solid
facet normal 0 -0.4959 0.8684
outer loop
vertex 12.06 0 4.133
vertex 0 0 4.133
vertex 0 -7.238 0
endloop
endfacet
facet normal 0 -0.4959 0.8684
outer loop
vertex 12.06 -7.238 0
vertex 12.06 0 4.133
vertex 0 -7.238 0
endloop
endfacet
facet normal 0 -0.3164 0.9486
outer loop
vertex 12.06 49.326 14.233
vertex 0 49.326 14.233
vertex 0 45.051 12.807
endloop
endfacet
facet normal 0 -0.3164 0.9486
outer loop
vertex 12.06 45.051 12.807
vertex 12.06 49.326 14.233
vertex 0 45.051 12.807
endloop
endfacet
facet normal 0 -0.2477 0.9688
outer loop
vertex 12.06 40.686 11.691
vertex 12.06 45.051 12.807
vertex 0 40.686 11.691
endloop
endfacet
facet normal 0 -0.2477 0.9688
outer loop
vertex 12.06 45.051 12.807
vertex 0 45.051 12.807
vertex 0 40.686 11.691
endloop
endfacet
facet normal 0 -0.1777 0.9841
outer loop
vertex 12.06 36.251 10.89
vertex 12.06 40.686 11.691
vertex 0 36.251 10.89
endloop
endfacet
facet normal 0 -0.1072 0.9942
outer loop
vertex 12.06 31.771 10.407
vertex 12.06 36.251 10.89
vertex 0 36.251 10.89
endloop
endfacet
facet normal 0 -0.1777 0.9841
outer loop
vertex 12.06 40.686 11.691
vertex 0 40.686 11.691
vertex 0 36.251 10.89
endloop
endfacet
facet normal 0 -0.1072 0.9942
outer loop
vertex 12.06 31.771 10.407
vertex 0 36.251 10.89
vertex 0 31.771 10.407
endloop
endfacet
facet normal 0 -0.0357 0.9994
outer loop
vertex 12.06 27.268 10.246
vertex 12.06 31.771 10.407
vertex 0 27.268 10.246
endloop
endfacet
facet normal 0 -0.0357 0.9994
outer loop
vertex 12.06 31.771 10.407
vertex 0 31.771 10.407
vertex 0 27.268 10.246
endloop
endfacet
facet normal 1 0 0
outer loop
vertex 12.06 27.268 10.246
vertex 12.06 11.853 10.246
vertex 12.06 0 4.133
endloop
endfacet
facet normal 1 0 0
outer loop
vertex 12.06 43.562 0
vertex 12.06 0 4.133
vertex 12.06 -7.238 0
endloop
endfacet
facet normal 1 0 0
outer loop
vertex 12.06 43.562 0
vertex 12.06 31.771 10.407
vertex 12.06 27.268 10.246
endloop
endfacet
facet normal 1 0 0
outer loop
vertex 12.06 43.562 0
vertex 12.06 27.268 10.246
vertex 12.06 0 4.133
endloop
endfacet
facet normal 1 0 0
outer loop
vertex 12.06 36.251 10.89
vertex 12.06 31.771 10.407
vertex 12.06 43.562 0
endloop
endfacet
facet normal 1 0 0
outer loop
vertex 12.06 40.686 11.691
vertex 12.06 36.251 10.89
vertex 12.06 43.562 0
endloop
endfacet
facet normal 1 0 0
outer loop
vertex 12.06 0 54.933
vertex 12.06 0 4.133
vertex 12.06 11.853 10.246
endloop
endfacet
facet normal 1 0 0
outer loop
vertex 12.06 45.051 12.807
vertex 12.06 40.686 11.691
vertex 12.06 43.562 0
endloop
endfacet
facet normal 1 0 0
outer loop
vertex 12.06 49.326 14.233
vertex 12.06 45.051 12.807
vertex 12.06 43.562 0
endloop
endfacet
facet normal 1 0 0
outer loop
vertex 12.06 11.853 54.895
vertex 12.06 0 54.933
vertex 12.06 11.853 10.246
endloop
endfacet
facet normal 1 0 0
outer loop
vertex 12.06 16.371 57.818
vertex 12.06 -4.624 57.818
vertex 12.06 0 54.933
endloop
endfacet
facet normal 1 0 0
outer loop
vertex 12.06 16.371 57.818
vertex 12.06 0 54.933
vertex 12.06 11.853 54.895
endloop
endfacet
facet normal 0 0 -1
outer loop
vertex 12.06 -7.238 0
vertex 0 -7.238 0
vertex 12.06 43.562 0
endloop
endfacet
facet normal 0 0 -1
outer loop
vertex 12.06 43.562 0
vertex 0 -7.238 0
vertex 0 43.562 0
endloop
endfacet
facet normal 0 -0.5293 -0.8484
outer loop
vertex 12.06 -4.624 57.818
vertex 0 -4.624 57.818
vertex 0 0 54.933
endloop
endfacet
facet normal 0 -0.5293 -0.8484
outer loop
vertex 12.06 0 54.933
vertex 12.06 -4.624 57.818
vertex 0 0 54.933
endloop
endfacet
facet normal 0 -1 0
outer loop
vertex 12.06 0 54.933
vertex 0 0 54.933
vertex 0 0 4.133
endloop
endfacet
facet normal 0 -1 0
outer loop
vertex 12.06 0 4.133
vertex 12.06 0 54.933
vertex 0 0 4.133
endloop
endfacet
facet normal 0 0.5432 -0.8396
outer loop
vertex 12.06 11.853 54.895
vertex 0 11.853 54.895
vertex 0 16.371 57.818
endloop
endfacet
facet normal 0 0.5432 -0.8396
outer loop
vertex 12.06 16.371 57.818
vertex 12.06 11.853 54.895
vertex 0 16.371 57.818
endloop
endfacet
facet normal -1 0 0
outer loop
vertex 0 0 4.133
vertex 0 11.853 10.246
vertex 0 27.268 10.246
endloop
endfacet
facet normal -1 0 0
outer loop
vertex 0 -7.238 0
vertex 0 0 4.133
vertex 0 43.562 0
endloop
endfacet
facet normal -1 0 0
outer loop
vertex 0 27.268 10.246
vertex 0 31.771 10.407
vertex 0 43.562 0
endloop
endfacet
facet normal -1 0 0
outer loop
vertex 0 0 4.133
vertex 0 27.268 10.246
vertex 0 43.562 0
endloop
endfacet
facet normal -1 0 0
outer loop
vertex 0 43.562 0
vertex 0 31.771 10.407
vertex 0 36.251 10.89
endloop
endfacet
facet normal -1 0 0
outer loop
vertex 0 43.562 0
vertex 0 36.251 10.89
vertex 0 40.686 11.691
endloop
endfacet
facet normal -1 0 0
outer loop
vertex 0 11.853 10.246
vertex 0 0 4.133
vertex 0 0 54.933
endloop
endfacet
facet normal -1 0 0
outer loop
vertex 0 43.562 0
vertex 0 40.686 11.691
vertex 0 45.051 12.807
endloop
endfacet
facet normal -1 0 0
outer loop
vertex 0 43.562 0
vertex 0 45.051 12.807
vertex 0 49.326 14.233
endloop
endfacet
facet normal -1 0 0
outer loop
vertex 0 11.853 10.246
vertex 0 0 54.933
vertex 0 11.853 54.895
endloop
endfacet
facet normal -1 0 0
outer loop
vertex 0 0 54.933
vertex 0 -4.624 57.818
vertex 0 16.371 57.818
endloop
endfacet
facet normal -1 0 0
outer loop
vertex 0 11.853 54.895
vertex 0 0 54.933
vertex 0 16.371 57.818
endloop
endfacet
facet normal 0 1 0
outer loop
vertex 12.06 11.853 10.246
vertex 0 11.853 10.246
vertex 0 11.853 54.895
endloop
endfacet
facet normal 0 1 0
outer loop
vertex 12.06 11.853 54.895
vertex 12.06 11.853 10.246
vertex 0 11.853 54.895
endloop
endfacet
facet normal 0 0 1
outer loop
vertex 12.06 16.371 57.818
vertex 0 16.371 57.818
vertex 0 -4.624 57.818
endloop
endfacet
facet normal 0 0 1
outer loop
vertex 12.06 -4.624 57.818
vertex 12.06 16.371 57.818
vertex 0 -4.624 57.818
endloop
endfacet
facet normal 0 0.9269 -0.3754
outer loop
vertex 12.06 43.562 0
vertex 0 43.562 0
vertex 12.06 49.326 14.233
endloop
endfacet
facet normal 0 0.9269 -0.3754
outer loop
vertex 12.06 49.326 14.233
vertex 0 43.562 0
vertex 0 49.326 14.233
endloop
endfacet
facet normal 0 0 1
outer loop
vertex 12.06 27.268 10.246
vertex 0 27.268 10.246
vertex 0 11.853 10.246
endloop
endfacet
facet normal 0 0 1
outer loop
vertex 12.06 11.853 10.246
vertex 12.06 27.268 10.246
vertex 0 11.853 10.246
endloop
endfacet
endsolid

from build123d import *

# Parameters (mm, degrees)
F1_DEPTH = 12.05993
F3_DEPTH = 12.23708
F4_W     = 63.86287231
F4_H     = 63.649994554
F5_DEPTH = 2.13452
F6_R     = 49.0086529646
F6_W     = 63.86287231
F6_H     = 63.649994554
F7_DEPTH = 9.144


with BuildPart() as f1:
    # F0 (on Right) → F1 (new body)
    with BuildSketch(Plane.YZ):
        with BuildLine():
            Line((0, 4.1334182024), (-7.2379880522, 0))
            Line((-7.2379880522, 0), (43.5620119478, 0))
            Line((43.5620119478, 0), (49.3261106312, 14.2325060442))
            ThreePointArc((49.3261106312, 14.2325060442), (38.4755079225, 11.2506522164), (27.267575264, 10.2460244671))
            Line((27.267575264, 10.2460244671), (11.8531771004, 10.2460244671))
            Line((11.8531771004, 10.2460244671), (11.8531771004, 54.8946261406))
            Line((11.8531771004, 54.8946261406), (16.3711905479, 57.8180477023))
            Line((16.3711905479, 57.8180477023), (-4.6242829412, 57.8180477023))
            Line((-4.6242829412, 57.8180477023), (0, 54.9334182024))
            Line((0, 54.9334182024), (0, 4.1334182024))
        make_face()
    extrude(amount=F1_DEPTH)


with BuildPart() as f3:
    # F2 (on Right) → F3 (new body)
    with BuildSketch(Plane.YZ):
        Polygon((-8.8458675891, -1.5856656246), (-10.2534089237, -3.0272443658), (53.2465910763, -3.0272443658), (51.5569411218, -1.4188061468), align=None)
        Polygon((-10.2534089237, 60.4727556342), (-10.2534089237, -3.0272443658), (-8.8458675891, -1.5856656246), (-8.8458675891, 58.8171444833), align=None)
        Polygon((51.5569411218, -1.4188061468), (53.2465910763, -3.0272443658), (53.2465910763, 60.4727556342), (51.5569411218, 58.8171444833), align=None)
        Polygon((53.2465910763, 60.4727556342), (-10.2534089237, 60.4727556342), (-8.8458675891, 58.8171444833), (51.5569411218, 58.8171444833), align=None)
    extrude(amount=F3_DEPTH)


with BuildPart() as f5:
    # F4 (on Right) → F5 (new body)
    with BuildSketch(Plane.YZ):
        with Locations((21.525492426, 28.6787872901)):
            Rectangle(F4_W, F4_H)
    extrude(amount=-F5_DEPTH)

    # F6 (on face) → F7 (join)
    with BuildSketch(Plane(origin=(-2.13452, 0, 0), x_dir=(0, -1, 0), z_dir=(-1, 0, 0))):
        with Locations((-21.525492426, 28.6787872901)):
            Circle(F6_R)
        with Locations((-21.525492426, 28.6787872901)):
            Rectangle(F6_W, F6_H, mode=Mode.SUBTRACT)
    extrude(amount=-F7_DEPTH)


solid = f1.part
